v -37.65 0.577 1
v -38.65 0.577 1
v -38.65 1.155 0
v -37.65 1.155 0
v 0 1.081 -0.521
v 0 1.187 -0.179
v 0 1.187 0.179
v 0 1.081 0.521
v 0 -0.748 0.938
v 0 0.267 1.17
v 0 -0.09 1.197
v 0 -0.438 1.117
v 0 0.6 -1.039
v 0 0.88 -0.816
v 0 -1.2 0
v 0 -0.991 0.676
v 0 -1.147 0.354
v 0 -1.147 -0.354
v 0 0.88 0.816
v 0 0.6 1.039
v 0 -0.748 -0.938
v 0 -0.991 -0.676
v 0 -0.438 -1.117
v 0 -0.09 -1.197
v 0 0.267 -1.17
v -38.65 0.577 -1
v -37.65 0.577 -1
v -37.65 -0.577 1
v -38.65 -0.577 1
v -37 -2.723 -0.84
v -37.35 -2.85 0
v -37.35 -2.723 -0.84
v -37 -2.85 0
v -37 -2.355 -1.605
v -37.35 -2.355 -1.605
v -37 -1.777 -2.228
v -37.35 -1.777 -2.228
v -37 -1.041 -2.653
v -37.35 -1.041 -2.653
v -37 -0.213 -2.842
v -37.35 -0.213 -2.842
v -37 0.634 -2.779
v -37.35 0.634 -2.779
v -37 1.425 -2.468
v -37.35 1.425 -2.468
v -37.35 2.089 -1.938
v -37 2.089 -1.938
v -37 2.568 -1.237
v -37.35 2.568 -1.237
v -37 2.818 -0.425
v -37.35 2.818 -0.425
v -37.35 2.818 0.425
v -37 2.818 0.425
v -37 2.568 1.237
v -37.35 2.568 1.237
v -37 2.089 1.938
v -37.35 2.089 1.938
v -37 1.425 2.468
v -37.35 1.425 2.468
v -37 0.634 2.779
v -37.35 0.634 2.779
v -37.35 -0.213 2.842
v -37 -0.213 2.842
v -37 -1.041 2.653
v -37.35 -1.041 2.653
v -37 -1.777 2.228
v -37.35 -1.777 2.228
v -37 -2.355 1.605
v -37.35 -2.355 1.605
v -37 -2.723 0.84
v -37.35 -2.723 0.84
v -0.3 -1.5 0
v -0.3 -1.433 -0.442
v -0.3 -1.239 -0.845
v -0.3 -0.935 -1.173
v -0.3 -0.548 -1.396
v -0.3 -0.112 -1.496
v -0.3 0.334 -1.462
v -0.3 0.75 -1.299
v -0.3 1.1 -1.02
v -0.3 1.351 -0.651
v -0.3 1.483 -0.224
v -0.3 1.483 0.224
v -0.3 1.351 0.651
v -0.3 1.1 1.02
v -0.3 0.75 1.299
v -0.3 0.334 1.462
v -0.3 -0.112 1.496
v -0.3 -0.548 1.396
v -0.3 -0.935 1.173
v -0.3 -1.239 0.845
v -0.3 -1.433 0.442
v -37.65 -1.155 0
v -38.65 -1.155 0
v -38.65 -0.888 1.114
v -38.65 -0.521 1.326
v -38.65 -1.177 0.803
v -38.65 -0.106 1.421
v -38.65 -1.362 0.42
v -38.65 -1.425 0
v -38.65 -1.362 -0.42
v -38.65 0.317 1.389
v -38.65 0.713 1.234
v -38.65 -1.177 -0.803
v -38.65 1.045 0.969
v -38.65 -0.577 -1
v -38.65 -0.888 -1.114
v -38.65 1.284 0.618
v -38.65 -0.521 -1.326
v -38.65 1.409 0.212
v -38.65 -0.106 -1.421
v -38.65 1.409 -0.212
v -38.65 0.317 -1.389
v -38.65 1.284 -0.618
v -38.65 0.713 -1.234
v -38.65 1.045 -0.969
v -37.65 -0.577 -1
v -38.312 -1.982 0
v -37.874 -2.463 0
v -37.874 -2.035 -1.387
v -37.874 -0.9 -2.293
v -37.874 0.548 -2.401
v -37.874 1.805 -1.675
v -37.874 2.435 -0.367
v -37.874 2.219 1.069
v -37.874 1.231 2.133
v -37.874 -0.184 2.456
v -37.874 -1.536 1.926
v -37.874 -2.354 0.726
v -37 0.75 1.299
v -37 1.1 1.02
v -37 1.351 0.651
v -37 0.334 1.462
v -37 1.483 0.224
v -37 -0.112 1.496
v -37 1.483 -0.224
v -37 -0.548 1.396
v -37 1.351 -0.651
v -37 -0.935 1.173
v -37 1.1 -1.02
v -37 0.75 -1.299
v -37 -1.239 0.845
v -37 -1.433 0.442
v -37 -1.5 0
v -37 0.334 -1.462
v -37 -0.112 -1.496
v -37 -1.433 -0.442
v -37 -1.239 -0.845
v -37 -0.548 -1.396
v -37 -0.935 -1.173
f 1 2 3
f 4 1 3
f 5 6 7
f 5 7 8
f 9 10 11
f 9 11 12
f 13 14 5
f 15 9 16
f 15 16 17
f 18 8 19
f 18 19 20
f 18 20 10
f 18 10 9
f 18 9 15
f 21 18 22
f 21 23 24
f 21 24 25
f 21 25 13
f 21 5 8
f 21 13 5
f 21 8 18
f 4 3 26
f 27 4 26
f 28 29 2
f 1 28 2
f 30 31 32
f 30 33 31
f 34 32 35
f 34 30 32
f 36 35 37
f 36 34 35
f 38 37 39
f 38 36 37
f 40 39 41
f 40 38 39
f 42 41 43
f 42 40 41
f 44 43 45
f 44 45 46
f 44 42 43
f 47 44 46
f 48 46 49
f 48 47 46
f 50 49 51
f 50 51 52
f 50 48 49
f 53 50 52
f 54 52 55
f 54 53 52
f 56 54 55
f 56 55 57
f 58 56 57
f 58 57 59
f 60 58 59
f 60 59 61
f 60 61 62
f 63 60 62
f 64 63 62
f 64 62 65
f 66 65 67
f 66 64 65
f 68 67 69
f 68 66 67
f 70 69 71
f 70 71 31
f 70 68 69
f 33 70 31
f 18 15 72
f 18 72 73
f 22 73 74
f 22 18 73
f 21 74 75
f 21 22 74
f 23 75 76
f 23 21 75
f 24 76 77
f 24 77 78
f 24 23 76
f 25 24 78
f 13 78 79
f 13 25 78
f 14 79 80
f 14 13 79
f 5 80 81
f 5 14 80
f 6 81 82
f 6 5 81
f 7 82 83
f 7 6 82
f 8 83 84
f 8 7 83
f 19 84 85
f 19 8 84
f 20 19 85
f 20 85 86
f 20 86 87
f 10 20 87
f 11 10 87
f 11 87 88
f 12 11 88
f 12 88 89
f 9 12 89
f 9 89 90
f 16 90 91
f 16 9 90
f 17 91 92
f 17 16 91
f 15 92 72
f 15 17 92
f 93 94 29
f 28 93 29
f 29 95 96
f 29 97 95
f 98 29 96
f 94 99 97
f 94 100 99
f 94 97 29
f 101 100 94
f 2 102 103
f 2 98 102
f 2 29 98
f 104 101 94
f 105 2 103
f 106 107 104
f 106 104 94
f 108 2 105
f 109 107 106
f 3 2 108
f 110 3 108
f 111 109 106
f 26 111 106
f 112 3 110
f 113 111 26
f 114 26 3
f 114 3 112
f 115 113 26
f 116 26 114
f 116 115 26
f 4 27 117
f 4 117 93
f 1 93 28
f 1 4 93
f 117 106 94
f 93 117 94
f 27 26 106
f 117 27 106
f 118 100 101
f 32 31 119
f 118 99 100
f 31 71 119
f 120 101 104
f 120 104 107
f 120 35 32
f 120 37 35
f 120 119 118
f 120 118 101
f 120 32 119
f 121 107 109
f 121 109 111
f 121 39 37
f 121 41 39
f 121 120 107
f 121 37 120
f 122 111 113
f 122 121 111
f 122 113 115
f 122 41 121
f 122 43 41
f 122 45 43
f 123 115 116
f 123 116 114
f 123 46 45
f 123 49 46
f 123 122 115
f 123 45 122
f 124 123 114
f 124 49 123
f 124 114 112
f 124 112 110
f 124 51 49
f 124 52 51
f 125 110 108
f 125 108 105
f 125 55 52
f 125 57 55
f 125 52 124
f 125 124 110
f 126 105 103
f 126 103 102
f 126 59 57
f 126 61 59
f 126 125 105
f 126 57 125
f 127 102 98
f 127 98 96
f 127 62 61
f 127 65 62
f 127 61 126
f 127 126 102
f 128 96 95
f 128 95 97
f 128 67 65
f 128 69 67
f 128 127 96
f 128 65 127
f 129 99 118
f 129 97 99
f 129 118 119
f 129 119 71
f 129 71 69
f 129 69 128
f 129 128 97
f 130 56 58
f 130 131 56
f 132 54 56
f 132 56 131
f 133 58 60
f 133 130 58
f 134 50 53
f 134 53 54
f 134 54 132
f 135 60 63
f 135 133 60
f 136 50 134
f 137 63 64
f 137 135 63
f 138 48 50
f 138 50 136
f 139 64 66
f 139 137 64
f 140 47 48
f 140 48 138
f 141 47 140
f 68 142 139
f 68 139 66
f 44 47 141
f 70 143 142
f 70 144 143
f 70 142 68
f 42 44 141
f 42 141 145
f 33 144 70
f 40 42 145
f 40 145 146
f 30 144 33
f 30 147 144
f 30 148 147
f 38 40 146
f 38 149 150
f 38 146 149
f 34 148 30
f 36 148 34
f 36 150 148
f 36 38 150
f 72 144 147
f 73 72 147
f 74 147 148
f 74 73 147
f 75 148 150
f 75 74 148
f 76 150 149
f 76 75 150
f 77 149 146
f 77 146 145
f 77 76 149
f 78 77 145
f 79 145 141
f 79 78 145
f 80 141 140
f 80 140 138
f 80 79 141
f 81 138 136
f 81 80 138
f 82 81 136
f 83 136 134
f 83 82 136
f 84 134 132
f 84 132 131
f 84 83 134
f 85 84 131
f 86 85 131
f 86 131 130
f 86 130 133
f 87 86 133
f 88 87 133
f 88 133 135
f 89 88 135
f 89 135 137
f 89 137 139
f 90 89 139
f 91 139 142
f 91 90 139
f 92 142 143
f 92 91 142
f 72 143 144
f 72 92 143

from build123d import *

# Parameters (mm, degrees)
CUT_EXTRUDE1_DEPTH = 1
CHAMFER1_SIZE      = 0.3


with BuildPart() as part:
    # Sketch1 → Revolve1 (revolve)
    with BuildSketch(Plane.XY, mode=Mode.PRIVATE) as revolve1_sk:
        with BuildLine():
            Line((-38.65, 0), (-38.65, 1.425))
            ThreePointArc((-38.65, 1.425), (-38.104780452, 2.233089184), (-37.35, 2.85))
            Line((-37.35, 2.85), (-37, 2.85))
            Line((-37, 2.85), (-37, 1.5))
            Line((-37, 1.5), (0, 1.5))
            Line((0, 1.5), (0, 0))
            Line((0, 0), (-38.65, 0))
        make_face()
    revolve(revolve1_sk.sketch.rotate(Axis((-45.185840708, 0, 0), (1, 0, 0)), 180), axis=Axis((-45.185840708, 0, 0), (1, 0, 0)))

    # Sketch2 → Cut-Extrude1 (cut)
    with BuildSketch(Plane.ZY.offset(38.65)):
        Polygon((0, 1.154700538), (-1, 0.577350269), (-1, -0.577350269), (0, -1.154700538), (1, -0.577350269), (1, 0.577350269), align=None)
    extrude(amount=-CUT_EXTRUDE1_DEPTH, mode=Mode.SUBTRACT)

    # Chamfer1
    chamfer1_edges = [part.edges().sort_by_distance(p)[0] for p in [
        (0, 1.5, 0),
    ]]
    chamfer(chamfer1_edges, length=CHAMFER1_SIZE)


solid = part.part
